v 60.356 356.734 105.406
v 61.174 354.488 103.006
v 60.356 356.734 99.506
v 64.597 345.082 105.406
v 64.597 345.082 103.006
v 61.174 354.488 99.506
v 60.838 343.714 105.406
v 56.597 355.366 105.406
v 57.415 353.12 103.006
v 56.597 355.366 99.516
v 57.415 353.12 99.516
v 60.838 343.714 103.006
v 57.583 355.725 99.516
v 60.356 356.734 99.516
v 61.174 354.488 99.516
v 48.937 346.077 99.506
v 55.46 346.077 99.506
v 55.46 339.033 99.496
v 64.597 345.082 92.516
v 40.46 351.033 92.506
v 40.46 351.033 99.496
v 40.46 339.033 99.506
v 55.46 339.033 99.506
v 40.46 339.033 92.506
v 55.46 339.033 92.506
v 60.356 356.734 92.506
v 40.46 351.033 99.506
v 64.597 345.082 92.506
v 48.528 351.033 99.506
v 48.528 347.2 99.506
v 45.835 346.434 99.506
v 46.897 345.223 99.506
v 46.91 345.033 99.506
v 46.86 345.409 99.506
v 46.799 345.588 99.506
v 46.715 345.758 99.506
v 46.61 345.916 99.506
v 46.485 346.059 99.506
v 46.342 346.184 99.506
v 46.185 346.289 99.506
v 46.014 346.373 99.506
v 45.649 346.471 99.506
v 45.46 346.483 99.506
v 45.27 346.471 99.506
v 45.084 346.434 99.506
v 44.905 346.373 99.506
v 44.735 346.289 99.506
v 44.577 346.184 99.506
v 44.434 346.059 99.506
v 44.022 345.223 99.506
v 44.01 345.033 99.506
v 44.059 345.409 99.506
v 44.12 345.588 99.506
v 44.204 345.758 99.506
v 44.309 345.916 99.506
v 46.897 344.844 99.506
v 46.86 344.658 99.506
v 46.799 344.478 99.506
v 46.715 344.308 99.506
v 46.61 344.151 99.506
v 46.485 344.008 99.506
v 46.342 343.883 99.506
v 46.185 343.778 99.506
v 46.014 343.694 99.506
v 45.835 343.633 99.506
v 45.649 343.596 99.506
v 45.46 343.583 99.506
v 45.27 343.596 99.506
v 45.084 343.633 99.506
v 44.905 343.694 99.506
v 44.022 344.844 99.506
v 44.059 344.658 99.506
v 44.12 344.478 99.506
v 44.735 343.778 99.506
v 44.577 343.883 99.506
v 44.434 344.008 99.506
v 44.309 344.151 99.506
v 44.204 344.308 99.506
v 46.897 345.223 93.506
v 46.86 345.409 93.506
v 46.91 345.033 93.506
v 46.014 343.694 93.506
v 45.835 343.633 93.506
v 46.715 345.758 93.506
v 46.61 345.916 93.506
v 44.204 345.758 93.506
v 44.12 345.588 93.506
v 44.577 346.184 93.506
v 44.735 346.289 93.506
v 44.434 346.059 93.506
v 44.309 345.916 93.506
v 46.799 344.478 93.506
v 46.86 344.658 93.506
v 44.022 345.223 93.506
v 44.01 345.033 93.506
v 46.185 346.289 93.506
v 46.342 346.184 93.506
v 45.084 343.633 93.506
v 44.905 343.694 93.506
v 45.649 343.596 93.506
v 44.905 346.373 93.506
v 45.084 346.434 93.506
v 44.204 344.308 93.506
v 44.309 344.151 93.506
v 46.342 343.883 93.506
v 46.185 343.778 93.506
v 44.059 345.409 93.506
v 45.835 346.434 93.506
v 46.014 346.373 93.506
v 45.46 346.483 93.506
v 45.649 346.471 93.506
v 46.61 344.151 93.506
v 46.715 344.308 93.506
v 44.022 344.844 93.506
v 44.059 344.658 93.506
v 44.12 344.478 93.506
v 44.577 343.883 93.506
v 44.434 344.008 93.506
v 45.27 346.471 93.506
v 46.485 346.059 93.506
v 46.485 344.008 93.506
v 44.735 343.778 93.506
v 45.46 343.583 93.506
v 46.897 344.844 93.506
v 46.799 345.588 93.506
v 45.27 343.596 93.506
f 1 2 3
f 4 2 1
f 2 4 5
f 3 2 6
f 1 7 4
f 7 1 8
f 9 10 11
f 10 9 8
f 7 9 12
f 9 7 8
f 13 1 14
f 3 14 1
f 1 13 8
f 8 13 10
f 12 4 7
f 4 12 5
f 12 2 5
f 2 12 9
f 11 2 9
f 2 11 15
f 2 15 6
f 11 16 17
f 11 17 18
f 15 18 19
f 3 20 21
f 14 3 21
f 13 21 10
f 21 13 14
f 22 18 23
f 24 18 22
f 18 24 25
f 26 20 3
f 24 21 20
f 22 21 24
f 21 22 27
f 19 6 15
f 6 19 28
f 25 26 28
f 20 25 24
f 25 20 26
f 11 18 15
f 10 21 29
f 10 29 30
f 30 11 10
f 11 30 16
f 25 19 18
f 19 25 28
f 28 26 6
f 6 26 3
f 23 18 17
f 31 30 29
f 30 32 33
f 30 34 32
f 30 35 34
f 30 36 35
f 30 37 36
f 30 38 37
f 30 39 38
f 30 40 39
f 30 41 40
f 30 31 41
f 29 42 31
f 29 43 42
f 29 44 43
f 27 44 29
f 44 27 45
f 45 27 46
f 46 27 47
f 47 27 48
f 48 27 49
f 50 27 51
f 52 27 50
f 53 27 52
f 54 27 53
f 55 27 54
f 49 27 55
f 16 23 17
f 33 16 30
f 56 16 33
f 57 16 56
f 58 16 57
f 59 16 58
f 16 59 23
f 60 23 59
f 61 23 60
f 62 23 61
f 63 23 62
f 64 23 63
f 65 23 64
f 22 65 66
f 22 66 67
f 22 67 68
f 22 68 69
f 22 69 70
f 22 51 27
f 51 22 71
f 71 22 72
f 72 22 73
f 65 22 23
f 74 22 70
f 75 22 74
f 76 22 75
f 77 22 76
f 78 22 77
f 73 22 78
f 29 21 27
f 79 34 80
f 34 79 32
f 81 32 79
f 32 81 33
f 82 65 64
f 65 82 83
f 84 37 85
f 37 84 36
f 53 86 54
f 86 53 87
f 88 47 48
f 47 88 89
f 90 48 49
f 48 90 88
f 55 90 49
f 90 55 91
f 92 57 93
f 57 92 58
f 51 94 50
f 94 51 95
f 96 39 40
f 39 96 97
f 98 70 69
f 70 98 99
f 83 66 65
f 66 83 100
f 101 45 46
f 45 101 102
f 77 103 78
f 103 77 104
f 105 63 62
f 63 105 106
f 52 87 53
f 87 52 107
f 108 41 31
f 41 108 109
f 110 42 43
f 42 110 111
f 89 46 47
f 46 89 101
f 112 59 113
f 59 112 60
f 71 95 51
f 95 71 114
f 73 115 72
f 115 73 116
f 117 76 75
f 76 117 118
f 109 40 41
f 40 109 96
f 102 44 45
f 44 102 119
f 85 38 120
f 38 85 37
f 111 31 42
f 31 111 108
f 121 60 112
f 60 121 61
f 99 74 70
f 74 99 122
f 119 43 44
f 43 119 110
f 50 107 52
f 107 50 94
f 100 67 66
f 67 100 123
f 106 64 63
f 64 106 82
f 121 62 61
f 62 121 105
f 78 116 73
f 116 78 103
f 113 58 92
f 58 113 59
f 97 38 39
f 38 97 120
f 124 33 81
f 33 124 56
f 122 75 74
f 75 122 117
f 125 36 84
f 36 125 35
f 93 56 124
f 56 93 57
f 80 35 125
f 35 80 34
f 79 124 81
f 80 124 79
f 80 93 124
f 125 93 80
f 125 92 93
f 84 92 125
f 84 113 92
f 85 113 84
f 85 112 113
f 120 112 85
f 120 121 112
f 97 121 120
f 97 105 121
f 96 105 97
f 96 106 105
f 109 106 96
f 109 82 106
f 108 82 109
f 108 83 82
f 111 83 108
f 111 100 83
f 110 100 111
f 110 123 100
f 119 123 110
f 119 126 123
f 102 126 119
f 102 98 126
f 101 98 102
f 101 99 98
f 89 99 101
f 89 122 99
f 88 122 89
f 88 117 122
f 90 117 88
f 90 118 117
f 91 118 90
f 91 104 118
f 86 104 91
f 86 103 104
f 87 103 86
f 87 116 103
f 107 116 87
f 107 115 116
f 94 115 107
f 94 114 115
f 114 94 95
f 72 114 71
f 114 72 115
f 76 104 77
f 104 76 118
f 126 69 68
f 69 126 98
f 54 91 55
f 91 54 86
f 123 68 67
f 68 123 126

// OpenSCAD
// file: cargo_door_hinge_params.scad
// cargo_door_hinge_params.scad -- GENERATED by generate_cargo_doors.py.
// Do not edit: change the shell/generator and re-run generate_cargo_doors.py
// to regenerate.  Aircraft datum R2, mm.  CARGO-HINGE-SYNC single source.
HINGE_X_PORT = 47.4596;
HINGE_Z_PORT = 85.5061;
HINGE_X_STBD = -47.4596;
HINGE_Z_STBD = 85.4947;
HINGE_BAY_Y_FWD = 307.7000;
HINGE_BAY_Y_AFT = 413.7000;
// file: cargo_layout_t5_params.scad
// cargo_layout_t5_params.scad -- GENERATED by tools/cargo_layout_fit.py
// --write-scad.  Do not edit: change the Python constants and regenerate.
// AIRCRAFT DATUM R2, mm (origin centreline / nose tip / ground plane;
// X=+port, Y=+aft, Z=+up).  2026-10-19.
// License: CERN-OHL-W-2.0 —
// see LICENSES/CERN-OHL-W 2.0 (SPDX-License-Identifier: CERN-OHL-W-2.0)
SHAFT_Y = 352.3000;
SHAFT_Z = 149.0900;
GEAR_MODULE = 1.0000;
WHEEL_N = 40.0000;
WORM_STARTS = 6.0000;
WHEEL_PD = 40.0000;
WORM_PD = 26.0000;
STAGE_C = 33.0000;
WORM_Z = 182.0900;
GEAR_X_OUT = 47.1000;
WHEEL_FACE = 5.0000;
WORM_X = 44.6000;
WORM_LEN = 10.0000;
MOTOR_D = 20.0000;
MOTOR_BODY_L = 41.0000;
MOTOR_ENC_L = 6.0000;
MOTOR_SHAFT_L = 18.0000;
MOTOR_FACE_Y = 344.8000;
MOTOR_HOLE_S = 15.0000;
BATT_L = 142.0000;
BATT_W = 50.0000;
BATT_H = 38.0000;
BATT_X0 = -25.0000;
BATT_X1 = 25.0000;
BATT_Y0 = 247.7000;
BATT_Y1 = 389.7000;
BATT_Z0 = 170.0000;
BATT_Z1 = 208.0000;
CRADLE_T = 2.4000;
CRADLE_FWD_BOSS_Y = 255.7000;
CRADLE_AFT_BOSS_Y = 385.7000;
CRADLE_BOSS_DX = 18.0000;
CRADLE_XC = 0.0000;
CRADLE_TOP_Z = 210.4000;
CRADLE_RELIEF_Z = 207.0000;
TRAY_X = 40.0000;
TRAY_Y = 60.0000;
TRAY_D = 55.0000;
INARA_XC = 37.8500;
INARA_YC = 391.7000;
INARA_BOSS_DX = 15.0000;
INARA_BOSS_DY = 25.0000;
NODE_L = 58.0000;
NODE_H = 37.0000;
NODE_T = 22.0000;
NODE_CABLE = 10.0000;
N_CHIN_X_IN = 5.0000;
N_CHIN_Y0 = 247.7000;
N_CHIN_Z0 = 146.0000;
N_AFT_Y0 = 405.2000;
N_AFT_Z0 = 167.0000;
HOIST_Y = 361.2000;
HOIST_DX = 30.9000;
LINE_R = 0.5000;
WORM_HUB_L = 2.5000;
WORM_OFFSET = 0.0000;
WORM_YC = 352.3000;
BRAKE_COLLAR_D = 14.0000;
BRAKE_COLLAR_L = 4.0000;
BRAKE_Y = 359.8000;
BRAKE_SOL_D = 12.0000;
BRAKE_SOL_L = 24.0000;
BRAKE_SOL_Y0 = 367.8000;
SENSOR_PCB_T = 3.0000;
STAGE_RATIO = 6.6667;
DRUM_D = 16.0000;
DRUM_L = 12.0000;
SPOOL_Z0 = 213.4000;
BATT_XC = 0.0000;
RAMP_X0 = -24.1500;
RAMP_X1 = 27.8500;
RAMP_Z0 = 88.0000;
RAMP_Z1 = 124.0000;
RAMP_OVERLAP = 6.0000;
X_CL = 0.0000;
GAP_MM = 3.0000;
BRAKE_SOL_X = 43.1000;
BOARD_L = 42.9000;
BOARD_W = 36.5000;
BOARD_T = 7.4000;
BOARD_X0 = 52.1000;
BOARD_Y0 = 360.7000;
BOARD_Z0 = 163.0000;
N_CHIN_Y1 = 305.7000;
N_CHIN_Z1 = 168.0000;
SHELF_T = 2.4000;
SHELF_Z0 = 143.6000;
SHELF_Y0 = 253.7000;
SHELF_Y1 = 307.3000;
SHELF_SILL_Y1 = 260.7000;
OBSERVER_L = 76.8000;
OBSERVER_W = 70.8000;
OBSERVER_T = 20.0000;
OBSERVER_Y0 = 414.2000;
OBSERVER_Z0 = 94.2000;
GW_PCB_L = 49.0000;
GW_PCB_W = 25.5000;
GW_PCB_T = 1.6000;
GW_FRONT_H = 9.0000;
GW_BACK_H = 3.0000;
GW_RAIL_T = 1.6000;
GW_RAIL_CLR = 0.3000;
GW_RAIL_LIP = 1.2000;
GW_BASE_T = 5.4000;
GW_CBORE_D = 6.0000;
GW_CBORE_H = 3.2000;
GW_BOSS_H = 4.0000;
GW_SLAB_Z = 86.2000;
GW_XC = 0.0000;
GW_X0 = -24.5000;
GW_X1 = 24.5000;
GW_TRAY_X0 = -26.1000;
GW_TRAY_X1 = 26.1000;
GW_BASE_Y0 = 288.4500;
GW_TRAY_Y0 = 289.7000;
GW_PCB_Y0 = 291.2000;
GW_PCB_Y1 = 292.8000;
GW_TRAY_Y1 = 294.3000;
GW_ENV_Y0 = 288.2000;
GW_ENV_Y1 = 301.8000;
GW_Z0 = 90.2000;
GW_PCB_Z0 = 95.6000;
GW_PCB_Z1 = 121.1000;
GW_TRAY_Z1 = 124.1000;
GW_BASE_Y1 = 303.7000;
GW_BOSS_DX = 19.0000;
GW_BOSS_H2 = 3.5000;
N_AFT_XC = [30.00, -31.00];
CRADLE_RELIEF_Y = [285.70, 307.70];
BRACKET_FEET = [[316.30, 204.09], [345.70, 204.09], [369.70, 157.00]];
SHELF_BOSS = [[-30.00, 256.70], [30.00, 256.70], [-20.00, 272.70], [20.00, 272.70]];
OBSERVER_BOSS = [[-30.00, 4.00, 4.00], [30.00, 4.00, 4.00], [-30.00, 8.50, 3.50], [30.00, 8.50, 3.50]];
GW_BOSS = [[-19.00, 292.70], [19.00, 292.70], [-19.00, 299.70], [19.00, 299.70]];
// main file
// ===========================================================================
// AIRCRAFT DATUM R2 (2026-10-19, plan 2026-10-19-001): origin centreline / nose / ground.
//   Hull frame (canonical for ALL design artifacts): X = +port (left),
//   Y = +aft (back), Z = +dorsal (up); origin = SerenityAssembly.FCStd
//   world origin.  MODELLED DIRECTLY IN HULL FRAME.
// ===========================================================================
// ============================================================
// door_latch_mechanism.scad -- Rev A (2026-09-21)
// Cargo clamshell door drive + POSITIVE mechanical latch, cross-linked port
// to starboard.  Closes the DOOR-LATCH finding in docs/CARGO_DOOR_GATEWAY_
// SPEC.md (Rev A S8): "the doors have no positive in-flight latch; retention
// is servo gear-train friction, forbidden for a flight-critical joint by
// AGENTS.md S7."  See docs/CARGO_DOOR_LATCH_SPEC.md for the full statics
// package (governing load, FOS, all margins) -- this file is geometry only.
//
// >>> ENGINEERING REVIEW REQUIRED. Reference material, not a certified
// >>> design. See docs/CARGO_DOOR_LATCH_SPEC.md S0 for the full notice.
//
// WHY A POSITIVE LATCH, QUANTIFIED (not just "friction is bad practice"):
// the SG90's own stall torque (0.177 N.m, REF-ACT-003) is LESS than the
// door-opening moment from 14 CFR SS107.51(a)'s 87 kt regulatory ceiling
// (0.202 N.m at Cp=1.0, worst door) -- the gear train cannot hold the door
// shut at V_max even with zero safety factor.  A mechanical latch is
// therefore a hard requirement, not a best-practice nicety.
//
// MECHANISM (one per door, port shown; stbd is a mirror about X_CL):
//   door horn (rH=8mm) --pushrod(2mm steel wire, Z-bend)--> bell-crank
//   (rA=5mm drive arm) on a fixed pivot bracket bolted to the airframe near
//   the door's 2nd hinge knuckle (Y=39.33).  The SAME crank carries a LATCH
//   ARM (rB=10mm) ending in a hook.  At phi_door=0 (closed) the hook has
//   swung fully into a MORTISE cut into a fixed frame boss: the hook's foot
//   sits UNDER a 2.4mm overhanging LIP on the mortise's outboard face.  Any
//   door-opening moment tries to rotate the crank the SAME sense that would
//   drive the hook FURTHER under the lip -- the lip is a hard mechanical
//   stop, not a friction detent or an over-centre linkage; it stops the
//   crank (and, via the now-rigid pushrod, the door) regardless of servo
//   power state.  To open, the servo actively rotates the crank the OTHER
//   way (increasing phi), which is the same rotation that lifts the hook
//   back out from under the lip -- normal, unassisted operation, no
//   separate release actuator.
//
// CROSS-LINK -- deliberately NOT a rigid crank-to-crank rod.  Two SG90s
// commanded open-loop by PWM do not reach a given angle at the same instant
// (independent slew, docs/CARGO_DOOR_LATCH_SPEC.md S4); a RIGID link between
// their cranks would fight itself every time the two servos are even
// briefly out of step, loading the pushrods/pins far beyond the S3 sizing
// and risking exactly the kind of joint AGENTS.md SS7 forbids.  The
// cross-link is instead TWO independent things that need no extra rod:
//   (a) SOFTWARE -- one signed DOOR_COMMAND frame drives both doors'
//       positions together (docs/CARGO_DOOR_GATEWAY_SPEC.md S4);
//   (b) STRUCTURAL -- door_seam_interlock.scad cuts a tongue-and-groove
//       joint the full length of the two doors' mating (free) edges at
//       X_CL, so the doors physically key to EACH OTHER when both are
//       closed: each door's own bell-crank latch (above) is still what
//       resists its own opening moment, but the interlocked seam shares
//       some of that moment with the other, independently-latched door
//       instead of leaving a single failed latch fully unrestrained.
// See docs/CARGO_DOOR_LATCH_SPEC.md S4 for both, including why a rigid
// mechanical rod between the two servos was rejected.
//
// Author: Steve Griffing, PE(CSE), CISSP-ISSEP, CPP
// AI note: Written by Claude (model: Claude Sonnet 5, Anthropic) under the
//   author's direction, 2026-09-21, per AGENTS.md SS3 AI attribution.
// License: CC BY 4.0 -- creativecommons.org/licenses/by/4.0
// ============================================================

include <cargo_layout_t5_params.scad>
include <cargo_door_hinge_params.scad>

$fn = 48;
EPS = 0.01;

// ---------------------------------------------------------------------------
// Door / hinge geometry (CARGO-HINGE-SYNC single source, 2026-09-21)
// ---------------------------------------------------------------------------
// HINGE_X_PORT/HINGE_Z_PORT/HINGE_X_STBD/HINGE_Z_STBD come from the
// `include <cargo_door_hinge_params.scad>` above -- generated fresh by
// generate_cargo_doors.py every run, not restated here.  A prior revision
// hardcoded these (and, before that, a different stale pair) with no
// mechanism to catch drift when the cargo shell is re-merged; both
// generate_cargo_hinge_retention.py and this file now import/include the
// same single source instead.  Regenerate the door STLs (which writes this
// include) before regenerating this file's parts whenever the shell changes.
// 2nd hinge knuckle station (generate_cargo_doors.py: 12 mm knuckles, 4 evenly
// spaced over the bay) -- clear of the aperture rim (bay fwd edge) and the
// GW-CARGO-DOOR tray.  DERIVED from the hinge include (aircraft datum R2;
// R1 value 39.33), never retyped.
KNUCKLE_LEN  = 12.0;
BRACKET_Y    = HINGE_BAY_Y_FWD + KNUCKLE_LEN / 2
               + (HINGE_BAY_Y_AFT - HINGE_BAY_Y_FWD - KNUCKLE_LEN) / 3;

// Pivot bracket stands PIVOT_H above the hinge Z, inboard of the hinge line
// by PIVOT_IN so the crank clears the door panel's swept arc.
PIVOT_H  = 14.0;
// Rev B (2026-10-26): 10 -> 2.  At 10 mm the bracket reached X 32.5, inside
// the payload keep-out (X +/-38.1 + 2 mm gap): 584 / 544 mm^3 in
// tools/cargo_bulkhead_context.py (BHD-06, owned by DOOR-REWORK).  At 2 mm the
// inboard face is at hinge - 7 = 40.5, clear of the 40.1 gap line.
PIVOT_IN = 2.0;
// BHD-06 (2026-10-12): the standoff ran down to the HINGE Z, so its base sat
// inside the closed door panel (door x bracket 252 / 254 mm^3, Z 3..6.5 at
// this station -- tools/cargo_bulkhead_context.py).  Its base now starts
// BASE_LIFT above the hinge: 1 mm over the door's top here (Z 6.5 + 1.0).
// The bracket still bonds to the hull wall along its outboard face.
// Rev B: 4.5 -> 7.0 -- with the pivot moved outboard the base sits over the
// door's hinge knuckles, whose sweep reaches hinge Z + ~5.
BASE_LIFT = 7.0;

// Crank arms (mm), all about the same pivot pin
ARM_DRIVE = 5.0;    // rA: to the door-horn pushrod (D-LATCH-1)
ARM_LATCH = 10.0;   // rB: to the hook (r_lip in the statics package)

// Angular layout (deg) of the two arms about the crank pivot, phi=0 = door
// fully closed.  DRIVE arm points toward the door horn at phi=0; LATCH arm
// points into the mortise.
ANG_DRIVE = 200.0;
ANG_LATCH = 20.0;

PIN_D = 3.0;  PIN_CL = 0.075;  PIN_BORE_R = PIN_D/2 + PIN_CL;

// Rev B (DOOR-REWORK, owner 2026-10-19): ONE latch, on the PORT door, now
// holds BOTH doors -- the port door's lap traps the starboard door's edge
// (generate_cargo_doors.py LAP_*), so the port latch reacts 2 x the Rev A
// door moment.  Hook root 5 x 2.4 (12 mm^2) -> 7 x 3.5 (24.5 mm^2) restores
// FOS_shear ~3.0; the lip pad widens with it (docs/CARGO_DOOR_LATCH_SPEC.md
// Rev B).
HOOK_L = 6.0;   HOOK_ROOT_W = 7.0;  HOOK_ROOT_T = 3.5;  // FOS_shear ~3.1 at 2 doors
HOOK_FOOT = 3.0;                                         // engagement depth under the lip
LIP_OVERHANG = 2.4;  LIP_PAD_W = 7.0;  LIP_PAD_T = 4.0;  // FOS_bearing ~9 at 2 doors
// Only these sides carry the hook + mortise.  The starboard bell-crank is a
// DRIVE-ONLY crank (no latch arm, no mortise): starboard is held shut by the
// port door's lap, never by its own latch.
LATCHED_SIDES = ["port"];
function is_latched(side) = len([for (s = LATCHED_SIDES) if (s == side) s]) > 0;
FILLET_R = 1.5;       // hook-root fillet -- reduces Kt; VERIFY by section/render

HORN_L = 8.0;  HORN_T = 3.0;  HORN_W = 6.0;

module pivot_boss(h = 8.0) {
    difference() {
        cylinder(h = h, d = 10.0);
        translate([0, 0, -1]) cylinder(h = h + 2, r = PIN_BORE_R);
    }
}

// One arm: a flat blade from the pivot out to the tip, with a small pad at
// the tip for the pushrod/hook/cross-rod feature.
module crank_arm(ang, len, w = 4.0, t = 3.0) {
    rotate([0, 0, ang])
        translate([0, -w / 2, 0])
            cube([len, w, t]);
}

module bell_crank(latch = true) {
    union() {
        pivot_boss();
        crank_arm(ANG_DRIVE, ARM_DRIVE, 4.0, 5.0);
        if (latch)
        // latch arm ends in the hook: an L-foot turned toward the lip's
        // engaged side (ANG_LATCH - 90, i.e. trailing the arm as phi
        // increases -- so INCREASING phi from 0 is the direction that lifts
        // the foot back out from under the lip, matching "opening = normal
        // servo rotation" above)
        union() {
            crank_arm(ANG_LATCH, ARM_LATCH, HOOK_ROOT_W, HOOK_ROOT_T);
            translate([ARM_LATCH * cos(ANG_LATCH), ARM_LATCH * sin(ANG_LATCH), 0])
                rotate([0, 0, ANG_LATCH])
                    translate([0, -HOOK_ROOT_W / 2, 0])
                        cube([HOOK_L, HOOK_ROOT_W, HOOK_ROOT_T]);
            translate([ARM_LATCH * cos(ANG_LATCH), ARM_LATCH * sin(ANG_LATCH), 0])
                rotate([0, 0, ANG_LATCH - 90])
                    translate([0, -HOOK_FOOT, 0])
                        cube([HOOK_ROOT_W, HOOK_FOOT + EPS, HOOK_ROOT_T]);
        }
        // NOTE: the hook-root fillet (FILLET_R) assumed in the Kt estimate
        // (docs/CARGO_DOOR_LATCH_SPEC.md) is NOT modelled here -- OpenSCAD
        // has no native fillet; apply it in FreeCAD/slicer post-process or
        // as a print-in-place radius on the mould line before flight parts
        // are cut. A first attempt at cutting it in CSG (a corner cube)
        // produced a single coincident non-manifold edge; removed rather
        // than chased, since it is cosmetic here, not structural.
    }
}

// Door horn: bonded to the door panel's inner face at the bracket's Y
// station, projecting HORN_L toward the crank's drive-arm pin at phi=0.
module door_horn() {
    difference() {
        translate([-HORN_T, -HORN_W / 2, 0]) cube([HORN_T + HORN_L, HORN_W, PIVOT_H]);
        translate([HORN_L - 2, 0, PIVOT_H - 4]) rotate([90, 0, 0])
            cylinder(h = HORN_W + 2, r = PIN_BORE_R, center = true);
    }
}

// Fixed mortise boss: the hook's engaged position (crank at phi=0, i.e. arm
// rotated to ANG_LATCH) defines the lip's location -- read directly off the
// crank at that pose so hook and mortise are always in registration.
module mortise_boss() {
    hx = ARM_LATCH * cos(ANG_LATCH) + HOOK_L * cos(ANG_LATCH);
    hy = ARM_LATCH * sin(ANG_LATCH) + HOOK_L * sin(ANG_LATCH);
    translate([hx, hy, 0])
        rotate([0, 0, ANG_LATCH])
            difference() {
                translate([-LIP_PAD_T / 2, -LIP_PAD_W / 2 - HOOK_FOOT, 0])
                    cube([LIP_PAD_T, LIP_PAD_W + HOOK_FOOT + LIP_OVERHANG, HOOK_ROOT_T + LIP_OVERHANG]);
                // pocket the hook drops into
                translate([-LIP_PAD_T / 2 - EPS, -LIP_PAD_W / 2 - HOOK_FOOT - EPS, -EPS])
                    cube([LIP_PAD_T + 2 * EPS, LIP_PAD_W + HOOK_FOOT + 2 * EPS, HOOK_ROOT_T + EPS]);
            }
}

// Pivot bracket: bonds to the airframe interior at BRACKET_Y, carries the
// crank pin boss and (unioned) the mortise so hook/lip registration is
// baked into one printed part per side -- no separate-part tolerance stack.
// Rev B part split (2026-10-26): the bell-crank ROTATES on the pivot pin, so
// it is its own printed part.  Rev A unioned it into the fixed bracket (one
// STL that could never move; the hook-in-pocket coincidence also left a
// zero-volume sliver body).  The bracket now carries the pin in a blind bore
// in the standoff top; the crank sits on that face and turns on the pin.
module at_pivot(side) {
    sgn = (side == "port") ? 1 : -1;
    hx = (side == "port") ? HINGE_X_PORT : HINGE_X_STBD;
    hz = (side == "port") ? HINGE_Z_PORT : HINGE_Z_STBD;
    translate([hx - sgn * PIVOT_IN, BRACKET_Y, hz + PIVOT_H])
        mirror(side == "stbd" ? [1, 0, 0] : [0, 0, 0])
            children();
}

PIN_SEAT_D = PIN_D - 0.1;   // press seat for the steel pin in the standoff
PIN_SEAT_H = 6.0;           // blind seat depth below the crank face

module bracket(side) {
    at_pivot(side) difference() {
        union() {
            translate([-5, -6, -PIVOT_H + BASE_LIFT])
                cube([15, 12, PIVOT_H - BASE_LIFT]);               // standoff to the hull
            if (is_latched(side)) {
                mortise_boss();
                // the mortise is FIXED structure: tie it to the standoff
                // BELOW the crank plane (z < 0), where the crank never sweeps
                hull() {
                    translate([-5, -6, -PIVOT_H + BASE_LIFT]) cube([15, 12, PIVOT_H - BASE_LIFT - EPS]);
                    intersection() {
                        mortise_boss();
                        translate([-50, -50, -1]) cube([100, 100, 1 + EPS]);
                    }
                    translate([0, 0, -PIVOT_H + BASE_LIFT]) linear_extrude(EPS)
                        projection() mortise_boss();
                }
            }
        }
        translate([0, 0, -PIN_SEAT_H]) cylinder(h = PIN_SEAT_H + EPS, d = PIN_SEAT_D);
    }
}

module crank(side) {
    at_pivot(side) bell_crank(latch = is_latched(side));
}

// PART selector (matches the repo's -D 'PART="..."' export convention)
PART = "bracket_port";  // [bracket_port, bracket_stbd, crank_port, crank_stbd, horn, preview]

if (PART == "bracket_port") bracket("port");
else if (PART == "bracket_stbd") bracket("stbd");
else if (PART == "crank_port") crank("port");
else if (PART == "crank_stbd") crank("stbd");
else if (PART == "horn") door_horn();
else if (PART == "preview") {
    color("SteelBlue") bracket("port");
    color("SteelBlue") bracket("stbd");
    color("Orange") crank("port");
    color("Orange") crank("stbd");
    color("Gray") translate([HINGE_X_PORT - PIVOT_IN + ARM_DRIVE * cos(ANG_DRIVE),
                              BRACKET_Y + ARM_DRIVE * sin(ANG_DRIVE), HINGE_Z_PORT + PIVOT_H])
        translate([-HORN_L, 0, -PIVOT_H]) door_horn();
}
